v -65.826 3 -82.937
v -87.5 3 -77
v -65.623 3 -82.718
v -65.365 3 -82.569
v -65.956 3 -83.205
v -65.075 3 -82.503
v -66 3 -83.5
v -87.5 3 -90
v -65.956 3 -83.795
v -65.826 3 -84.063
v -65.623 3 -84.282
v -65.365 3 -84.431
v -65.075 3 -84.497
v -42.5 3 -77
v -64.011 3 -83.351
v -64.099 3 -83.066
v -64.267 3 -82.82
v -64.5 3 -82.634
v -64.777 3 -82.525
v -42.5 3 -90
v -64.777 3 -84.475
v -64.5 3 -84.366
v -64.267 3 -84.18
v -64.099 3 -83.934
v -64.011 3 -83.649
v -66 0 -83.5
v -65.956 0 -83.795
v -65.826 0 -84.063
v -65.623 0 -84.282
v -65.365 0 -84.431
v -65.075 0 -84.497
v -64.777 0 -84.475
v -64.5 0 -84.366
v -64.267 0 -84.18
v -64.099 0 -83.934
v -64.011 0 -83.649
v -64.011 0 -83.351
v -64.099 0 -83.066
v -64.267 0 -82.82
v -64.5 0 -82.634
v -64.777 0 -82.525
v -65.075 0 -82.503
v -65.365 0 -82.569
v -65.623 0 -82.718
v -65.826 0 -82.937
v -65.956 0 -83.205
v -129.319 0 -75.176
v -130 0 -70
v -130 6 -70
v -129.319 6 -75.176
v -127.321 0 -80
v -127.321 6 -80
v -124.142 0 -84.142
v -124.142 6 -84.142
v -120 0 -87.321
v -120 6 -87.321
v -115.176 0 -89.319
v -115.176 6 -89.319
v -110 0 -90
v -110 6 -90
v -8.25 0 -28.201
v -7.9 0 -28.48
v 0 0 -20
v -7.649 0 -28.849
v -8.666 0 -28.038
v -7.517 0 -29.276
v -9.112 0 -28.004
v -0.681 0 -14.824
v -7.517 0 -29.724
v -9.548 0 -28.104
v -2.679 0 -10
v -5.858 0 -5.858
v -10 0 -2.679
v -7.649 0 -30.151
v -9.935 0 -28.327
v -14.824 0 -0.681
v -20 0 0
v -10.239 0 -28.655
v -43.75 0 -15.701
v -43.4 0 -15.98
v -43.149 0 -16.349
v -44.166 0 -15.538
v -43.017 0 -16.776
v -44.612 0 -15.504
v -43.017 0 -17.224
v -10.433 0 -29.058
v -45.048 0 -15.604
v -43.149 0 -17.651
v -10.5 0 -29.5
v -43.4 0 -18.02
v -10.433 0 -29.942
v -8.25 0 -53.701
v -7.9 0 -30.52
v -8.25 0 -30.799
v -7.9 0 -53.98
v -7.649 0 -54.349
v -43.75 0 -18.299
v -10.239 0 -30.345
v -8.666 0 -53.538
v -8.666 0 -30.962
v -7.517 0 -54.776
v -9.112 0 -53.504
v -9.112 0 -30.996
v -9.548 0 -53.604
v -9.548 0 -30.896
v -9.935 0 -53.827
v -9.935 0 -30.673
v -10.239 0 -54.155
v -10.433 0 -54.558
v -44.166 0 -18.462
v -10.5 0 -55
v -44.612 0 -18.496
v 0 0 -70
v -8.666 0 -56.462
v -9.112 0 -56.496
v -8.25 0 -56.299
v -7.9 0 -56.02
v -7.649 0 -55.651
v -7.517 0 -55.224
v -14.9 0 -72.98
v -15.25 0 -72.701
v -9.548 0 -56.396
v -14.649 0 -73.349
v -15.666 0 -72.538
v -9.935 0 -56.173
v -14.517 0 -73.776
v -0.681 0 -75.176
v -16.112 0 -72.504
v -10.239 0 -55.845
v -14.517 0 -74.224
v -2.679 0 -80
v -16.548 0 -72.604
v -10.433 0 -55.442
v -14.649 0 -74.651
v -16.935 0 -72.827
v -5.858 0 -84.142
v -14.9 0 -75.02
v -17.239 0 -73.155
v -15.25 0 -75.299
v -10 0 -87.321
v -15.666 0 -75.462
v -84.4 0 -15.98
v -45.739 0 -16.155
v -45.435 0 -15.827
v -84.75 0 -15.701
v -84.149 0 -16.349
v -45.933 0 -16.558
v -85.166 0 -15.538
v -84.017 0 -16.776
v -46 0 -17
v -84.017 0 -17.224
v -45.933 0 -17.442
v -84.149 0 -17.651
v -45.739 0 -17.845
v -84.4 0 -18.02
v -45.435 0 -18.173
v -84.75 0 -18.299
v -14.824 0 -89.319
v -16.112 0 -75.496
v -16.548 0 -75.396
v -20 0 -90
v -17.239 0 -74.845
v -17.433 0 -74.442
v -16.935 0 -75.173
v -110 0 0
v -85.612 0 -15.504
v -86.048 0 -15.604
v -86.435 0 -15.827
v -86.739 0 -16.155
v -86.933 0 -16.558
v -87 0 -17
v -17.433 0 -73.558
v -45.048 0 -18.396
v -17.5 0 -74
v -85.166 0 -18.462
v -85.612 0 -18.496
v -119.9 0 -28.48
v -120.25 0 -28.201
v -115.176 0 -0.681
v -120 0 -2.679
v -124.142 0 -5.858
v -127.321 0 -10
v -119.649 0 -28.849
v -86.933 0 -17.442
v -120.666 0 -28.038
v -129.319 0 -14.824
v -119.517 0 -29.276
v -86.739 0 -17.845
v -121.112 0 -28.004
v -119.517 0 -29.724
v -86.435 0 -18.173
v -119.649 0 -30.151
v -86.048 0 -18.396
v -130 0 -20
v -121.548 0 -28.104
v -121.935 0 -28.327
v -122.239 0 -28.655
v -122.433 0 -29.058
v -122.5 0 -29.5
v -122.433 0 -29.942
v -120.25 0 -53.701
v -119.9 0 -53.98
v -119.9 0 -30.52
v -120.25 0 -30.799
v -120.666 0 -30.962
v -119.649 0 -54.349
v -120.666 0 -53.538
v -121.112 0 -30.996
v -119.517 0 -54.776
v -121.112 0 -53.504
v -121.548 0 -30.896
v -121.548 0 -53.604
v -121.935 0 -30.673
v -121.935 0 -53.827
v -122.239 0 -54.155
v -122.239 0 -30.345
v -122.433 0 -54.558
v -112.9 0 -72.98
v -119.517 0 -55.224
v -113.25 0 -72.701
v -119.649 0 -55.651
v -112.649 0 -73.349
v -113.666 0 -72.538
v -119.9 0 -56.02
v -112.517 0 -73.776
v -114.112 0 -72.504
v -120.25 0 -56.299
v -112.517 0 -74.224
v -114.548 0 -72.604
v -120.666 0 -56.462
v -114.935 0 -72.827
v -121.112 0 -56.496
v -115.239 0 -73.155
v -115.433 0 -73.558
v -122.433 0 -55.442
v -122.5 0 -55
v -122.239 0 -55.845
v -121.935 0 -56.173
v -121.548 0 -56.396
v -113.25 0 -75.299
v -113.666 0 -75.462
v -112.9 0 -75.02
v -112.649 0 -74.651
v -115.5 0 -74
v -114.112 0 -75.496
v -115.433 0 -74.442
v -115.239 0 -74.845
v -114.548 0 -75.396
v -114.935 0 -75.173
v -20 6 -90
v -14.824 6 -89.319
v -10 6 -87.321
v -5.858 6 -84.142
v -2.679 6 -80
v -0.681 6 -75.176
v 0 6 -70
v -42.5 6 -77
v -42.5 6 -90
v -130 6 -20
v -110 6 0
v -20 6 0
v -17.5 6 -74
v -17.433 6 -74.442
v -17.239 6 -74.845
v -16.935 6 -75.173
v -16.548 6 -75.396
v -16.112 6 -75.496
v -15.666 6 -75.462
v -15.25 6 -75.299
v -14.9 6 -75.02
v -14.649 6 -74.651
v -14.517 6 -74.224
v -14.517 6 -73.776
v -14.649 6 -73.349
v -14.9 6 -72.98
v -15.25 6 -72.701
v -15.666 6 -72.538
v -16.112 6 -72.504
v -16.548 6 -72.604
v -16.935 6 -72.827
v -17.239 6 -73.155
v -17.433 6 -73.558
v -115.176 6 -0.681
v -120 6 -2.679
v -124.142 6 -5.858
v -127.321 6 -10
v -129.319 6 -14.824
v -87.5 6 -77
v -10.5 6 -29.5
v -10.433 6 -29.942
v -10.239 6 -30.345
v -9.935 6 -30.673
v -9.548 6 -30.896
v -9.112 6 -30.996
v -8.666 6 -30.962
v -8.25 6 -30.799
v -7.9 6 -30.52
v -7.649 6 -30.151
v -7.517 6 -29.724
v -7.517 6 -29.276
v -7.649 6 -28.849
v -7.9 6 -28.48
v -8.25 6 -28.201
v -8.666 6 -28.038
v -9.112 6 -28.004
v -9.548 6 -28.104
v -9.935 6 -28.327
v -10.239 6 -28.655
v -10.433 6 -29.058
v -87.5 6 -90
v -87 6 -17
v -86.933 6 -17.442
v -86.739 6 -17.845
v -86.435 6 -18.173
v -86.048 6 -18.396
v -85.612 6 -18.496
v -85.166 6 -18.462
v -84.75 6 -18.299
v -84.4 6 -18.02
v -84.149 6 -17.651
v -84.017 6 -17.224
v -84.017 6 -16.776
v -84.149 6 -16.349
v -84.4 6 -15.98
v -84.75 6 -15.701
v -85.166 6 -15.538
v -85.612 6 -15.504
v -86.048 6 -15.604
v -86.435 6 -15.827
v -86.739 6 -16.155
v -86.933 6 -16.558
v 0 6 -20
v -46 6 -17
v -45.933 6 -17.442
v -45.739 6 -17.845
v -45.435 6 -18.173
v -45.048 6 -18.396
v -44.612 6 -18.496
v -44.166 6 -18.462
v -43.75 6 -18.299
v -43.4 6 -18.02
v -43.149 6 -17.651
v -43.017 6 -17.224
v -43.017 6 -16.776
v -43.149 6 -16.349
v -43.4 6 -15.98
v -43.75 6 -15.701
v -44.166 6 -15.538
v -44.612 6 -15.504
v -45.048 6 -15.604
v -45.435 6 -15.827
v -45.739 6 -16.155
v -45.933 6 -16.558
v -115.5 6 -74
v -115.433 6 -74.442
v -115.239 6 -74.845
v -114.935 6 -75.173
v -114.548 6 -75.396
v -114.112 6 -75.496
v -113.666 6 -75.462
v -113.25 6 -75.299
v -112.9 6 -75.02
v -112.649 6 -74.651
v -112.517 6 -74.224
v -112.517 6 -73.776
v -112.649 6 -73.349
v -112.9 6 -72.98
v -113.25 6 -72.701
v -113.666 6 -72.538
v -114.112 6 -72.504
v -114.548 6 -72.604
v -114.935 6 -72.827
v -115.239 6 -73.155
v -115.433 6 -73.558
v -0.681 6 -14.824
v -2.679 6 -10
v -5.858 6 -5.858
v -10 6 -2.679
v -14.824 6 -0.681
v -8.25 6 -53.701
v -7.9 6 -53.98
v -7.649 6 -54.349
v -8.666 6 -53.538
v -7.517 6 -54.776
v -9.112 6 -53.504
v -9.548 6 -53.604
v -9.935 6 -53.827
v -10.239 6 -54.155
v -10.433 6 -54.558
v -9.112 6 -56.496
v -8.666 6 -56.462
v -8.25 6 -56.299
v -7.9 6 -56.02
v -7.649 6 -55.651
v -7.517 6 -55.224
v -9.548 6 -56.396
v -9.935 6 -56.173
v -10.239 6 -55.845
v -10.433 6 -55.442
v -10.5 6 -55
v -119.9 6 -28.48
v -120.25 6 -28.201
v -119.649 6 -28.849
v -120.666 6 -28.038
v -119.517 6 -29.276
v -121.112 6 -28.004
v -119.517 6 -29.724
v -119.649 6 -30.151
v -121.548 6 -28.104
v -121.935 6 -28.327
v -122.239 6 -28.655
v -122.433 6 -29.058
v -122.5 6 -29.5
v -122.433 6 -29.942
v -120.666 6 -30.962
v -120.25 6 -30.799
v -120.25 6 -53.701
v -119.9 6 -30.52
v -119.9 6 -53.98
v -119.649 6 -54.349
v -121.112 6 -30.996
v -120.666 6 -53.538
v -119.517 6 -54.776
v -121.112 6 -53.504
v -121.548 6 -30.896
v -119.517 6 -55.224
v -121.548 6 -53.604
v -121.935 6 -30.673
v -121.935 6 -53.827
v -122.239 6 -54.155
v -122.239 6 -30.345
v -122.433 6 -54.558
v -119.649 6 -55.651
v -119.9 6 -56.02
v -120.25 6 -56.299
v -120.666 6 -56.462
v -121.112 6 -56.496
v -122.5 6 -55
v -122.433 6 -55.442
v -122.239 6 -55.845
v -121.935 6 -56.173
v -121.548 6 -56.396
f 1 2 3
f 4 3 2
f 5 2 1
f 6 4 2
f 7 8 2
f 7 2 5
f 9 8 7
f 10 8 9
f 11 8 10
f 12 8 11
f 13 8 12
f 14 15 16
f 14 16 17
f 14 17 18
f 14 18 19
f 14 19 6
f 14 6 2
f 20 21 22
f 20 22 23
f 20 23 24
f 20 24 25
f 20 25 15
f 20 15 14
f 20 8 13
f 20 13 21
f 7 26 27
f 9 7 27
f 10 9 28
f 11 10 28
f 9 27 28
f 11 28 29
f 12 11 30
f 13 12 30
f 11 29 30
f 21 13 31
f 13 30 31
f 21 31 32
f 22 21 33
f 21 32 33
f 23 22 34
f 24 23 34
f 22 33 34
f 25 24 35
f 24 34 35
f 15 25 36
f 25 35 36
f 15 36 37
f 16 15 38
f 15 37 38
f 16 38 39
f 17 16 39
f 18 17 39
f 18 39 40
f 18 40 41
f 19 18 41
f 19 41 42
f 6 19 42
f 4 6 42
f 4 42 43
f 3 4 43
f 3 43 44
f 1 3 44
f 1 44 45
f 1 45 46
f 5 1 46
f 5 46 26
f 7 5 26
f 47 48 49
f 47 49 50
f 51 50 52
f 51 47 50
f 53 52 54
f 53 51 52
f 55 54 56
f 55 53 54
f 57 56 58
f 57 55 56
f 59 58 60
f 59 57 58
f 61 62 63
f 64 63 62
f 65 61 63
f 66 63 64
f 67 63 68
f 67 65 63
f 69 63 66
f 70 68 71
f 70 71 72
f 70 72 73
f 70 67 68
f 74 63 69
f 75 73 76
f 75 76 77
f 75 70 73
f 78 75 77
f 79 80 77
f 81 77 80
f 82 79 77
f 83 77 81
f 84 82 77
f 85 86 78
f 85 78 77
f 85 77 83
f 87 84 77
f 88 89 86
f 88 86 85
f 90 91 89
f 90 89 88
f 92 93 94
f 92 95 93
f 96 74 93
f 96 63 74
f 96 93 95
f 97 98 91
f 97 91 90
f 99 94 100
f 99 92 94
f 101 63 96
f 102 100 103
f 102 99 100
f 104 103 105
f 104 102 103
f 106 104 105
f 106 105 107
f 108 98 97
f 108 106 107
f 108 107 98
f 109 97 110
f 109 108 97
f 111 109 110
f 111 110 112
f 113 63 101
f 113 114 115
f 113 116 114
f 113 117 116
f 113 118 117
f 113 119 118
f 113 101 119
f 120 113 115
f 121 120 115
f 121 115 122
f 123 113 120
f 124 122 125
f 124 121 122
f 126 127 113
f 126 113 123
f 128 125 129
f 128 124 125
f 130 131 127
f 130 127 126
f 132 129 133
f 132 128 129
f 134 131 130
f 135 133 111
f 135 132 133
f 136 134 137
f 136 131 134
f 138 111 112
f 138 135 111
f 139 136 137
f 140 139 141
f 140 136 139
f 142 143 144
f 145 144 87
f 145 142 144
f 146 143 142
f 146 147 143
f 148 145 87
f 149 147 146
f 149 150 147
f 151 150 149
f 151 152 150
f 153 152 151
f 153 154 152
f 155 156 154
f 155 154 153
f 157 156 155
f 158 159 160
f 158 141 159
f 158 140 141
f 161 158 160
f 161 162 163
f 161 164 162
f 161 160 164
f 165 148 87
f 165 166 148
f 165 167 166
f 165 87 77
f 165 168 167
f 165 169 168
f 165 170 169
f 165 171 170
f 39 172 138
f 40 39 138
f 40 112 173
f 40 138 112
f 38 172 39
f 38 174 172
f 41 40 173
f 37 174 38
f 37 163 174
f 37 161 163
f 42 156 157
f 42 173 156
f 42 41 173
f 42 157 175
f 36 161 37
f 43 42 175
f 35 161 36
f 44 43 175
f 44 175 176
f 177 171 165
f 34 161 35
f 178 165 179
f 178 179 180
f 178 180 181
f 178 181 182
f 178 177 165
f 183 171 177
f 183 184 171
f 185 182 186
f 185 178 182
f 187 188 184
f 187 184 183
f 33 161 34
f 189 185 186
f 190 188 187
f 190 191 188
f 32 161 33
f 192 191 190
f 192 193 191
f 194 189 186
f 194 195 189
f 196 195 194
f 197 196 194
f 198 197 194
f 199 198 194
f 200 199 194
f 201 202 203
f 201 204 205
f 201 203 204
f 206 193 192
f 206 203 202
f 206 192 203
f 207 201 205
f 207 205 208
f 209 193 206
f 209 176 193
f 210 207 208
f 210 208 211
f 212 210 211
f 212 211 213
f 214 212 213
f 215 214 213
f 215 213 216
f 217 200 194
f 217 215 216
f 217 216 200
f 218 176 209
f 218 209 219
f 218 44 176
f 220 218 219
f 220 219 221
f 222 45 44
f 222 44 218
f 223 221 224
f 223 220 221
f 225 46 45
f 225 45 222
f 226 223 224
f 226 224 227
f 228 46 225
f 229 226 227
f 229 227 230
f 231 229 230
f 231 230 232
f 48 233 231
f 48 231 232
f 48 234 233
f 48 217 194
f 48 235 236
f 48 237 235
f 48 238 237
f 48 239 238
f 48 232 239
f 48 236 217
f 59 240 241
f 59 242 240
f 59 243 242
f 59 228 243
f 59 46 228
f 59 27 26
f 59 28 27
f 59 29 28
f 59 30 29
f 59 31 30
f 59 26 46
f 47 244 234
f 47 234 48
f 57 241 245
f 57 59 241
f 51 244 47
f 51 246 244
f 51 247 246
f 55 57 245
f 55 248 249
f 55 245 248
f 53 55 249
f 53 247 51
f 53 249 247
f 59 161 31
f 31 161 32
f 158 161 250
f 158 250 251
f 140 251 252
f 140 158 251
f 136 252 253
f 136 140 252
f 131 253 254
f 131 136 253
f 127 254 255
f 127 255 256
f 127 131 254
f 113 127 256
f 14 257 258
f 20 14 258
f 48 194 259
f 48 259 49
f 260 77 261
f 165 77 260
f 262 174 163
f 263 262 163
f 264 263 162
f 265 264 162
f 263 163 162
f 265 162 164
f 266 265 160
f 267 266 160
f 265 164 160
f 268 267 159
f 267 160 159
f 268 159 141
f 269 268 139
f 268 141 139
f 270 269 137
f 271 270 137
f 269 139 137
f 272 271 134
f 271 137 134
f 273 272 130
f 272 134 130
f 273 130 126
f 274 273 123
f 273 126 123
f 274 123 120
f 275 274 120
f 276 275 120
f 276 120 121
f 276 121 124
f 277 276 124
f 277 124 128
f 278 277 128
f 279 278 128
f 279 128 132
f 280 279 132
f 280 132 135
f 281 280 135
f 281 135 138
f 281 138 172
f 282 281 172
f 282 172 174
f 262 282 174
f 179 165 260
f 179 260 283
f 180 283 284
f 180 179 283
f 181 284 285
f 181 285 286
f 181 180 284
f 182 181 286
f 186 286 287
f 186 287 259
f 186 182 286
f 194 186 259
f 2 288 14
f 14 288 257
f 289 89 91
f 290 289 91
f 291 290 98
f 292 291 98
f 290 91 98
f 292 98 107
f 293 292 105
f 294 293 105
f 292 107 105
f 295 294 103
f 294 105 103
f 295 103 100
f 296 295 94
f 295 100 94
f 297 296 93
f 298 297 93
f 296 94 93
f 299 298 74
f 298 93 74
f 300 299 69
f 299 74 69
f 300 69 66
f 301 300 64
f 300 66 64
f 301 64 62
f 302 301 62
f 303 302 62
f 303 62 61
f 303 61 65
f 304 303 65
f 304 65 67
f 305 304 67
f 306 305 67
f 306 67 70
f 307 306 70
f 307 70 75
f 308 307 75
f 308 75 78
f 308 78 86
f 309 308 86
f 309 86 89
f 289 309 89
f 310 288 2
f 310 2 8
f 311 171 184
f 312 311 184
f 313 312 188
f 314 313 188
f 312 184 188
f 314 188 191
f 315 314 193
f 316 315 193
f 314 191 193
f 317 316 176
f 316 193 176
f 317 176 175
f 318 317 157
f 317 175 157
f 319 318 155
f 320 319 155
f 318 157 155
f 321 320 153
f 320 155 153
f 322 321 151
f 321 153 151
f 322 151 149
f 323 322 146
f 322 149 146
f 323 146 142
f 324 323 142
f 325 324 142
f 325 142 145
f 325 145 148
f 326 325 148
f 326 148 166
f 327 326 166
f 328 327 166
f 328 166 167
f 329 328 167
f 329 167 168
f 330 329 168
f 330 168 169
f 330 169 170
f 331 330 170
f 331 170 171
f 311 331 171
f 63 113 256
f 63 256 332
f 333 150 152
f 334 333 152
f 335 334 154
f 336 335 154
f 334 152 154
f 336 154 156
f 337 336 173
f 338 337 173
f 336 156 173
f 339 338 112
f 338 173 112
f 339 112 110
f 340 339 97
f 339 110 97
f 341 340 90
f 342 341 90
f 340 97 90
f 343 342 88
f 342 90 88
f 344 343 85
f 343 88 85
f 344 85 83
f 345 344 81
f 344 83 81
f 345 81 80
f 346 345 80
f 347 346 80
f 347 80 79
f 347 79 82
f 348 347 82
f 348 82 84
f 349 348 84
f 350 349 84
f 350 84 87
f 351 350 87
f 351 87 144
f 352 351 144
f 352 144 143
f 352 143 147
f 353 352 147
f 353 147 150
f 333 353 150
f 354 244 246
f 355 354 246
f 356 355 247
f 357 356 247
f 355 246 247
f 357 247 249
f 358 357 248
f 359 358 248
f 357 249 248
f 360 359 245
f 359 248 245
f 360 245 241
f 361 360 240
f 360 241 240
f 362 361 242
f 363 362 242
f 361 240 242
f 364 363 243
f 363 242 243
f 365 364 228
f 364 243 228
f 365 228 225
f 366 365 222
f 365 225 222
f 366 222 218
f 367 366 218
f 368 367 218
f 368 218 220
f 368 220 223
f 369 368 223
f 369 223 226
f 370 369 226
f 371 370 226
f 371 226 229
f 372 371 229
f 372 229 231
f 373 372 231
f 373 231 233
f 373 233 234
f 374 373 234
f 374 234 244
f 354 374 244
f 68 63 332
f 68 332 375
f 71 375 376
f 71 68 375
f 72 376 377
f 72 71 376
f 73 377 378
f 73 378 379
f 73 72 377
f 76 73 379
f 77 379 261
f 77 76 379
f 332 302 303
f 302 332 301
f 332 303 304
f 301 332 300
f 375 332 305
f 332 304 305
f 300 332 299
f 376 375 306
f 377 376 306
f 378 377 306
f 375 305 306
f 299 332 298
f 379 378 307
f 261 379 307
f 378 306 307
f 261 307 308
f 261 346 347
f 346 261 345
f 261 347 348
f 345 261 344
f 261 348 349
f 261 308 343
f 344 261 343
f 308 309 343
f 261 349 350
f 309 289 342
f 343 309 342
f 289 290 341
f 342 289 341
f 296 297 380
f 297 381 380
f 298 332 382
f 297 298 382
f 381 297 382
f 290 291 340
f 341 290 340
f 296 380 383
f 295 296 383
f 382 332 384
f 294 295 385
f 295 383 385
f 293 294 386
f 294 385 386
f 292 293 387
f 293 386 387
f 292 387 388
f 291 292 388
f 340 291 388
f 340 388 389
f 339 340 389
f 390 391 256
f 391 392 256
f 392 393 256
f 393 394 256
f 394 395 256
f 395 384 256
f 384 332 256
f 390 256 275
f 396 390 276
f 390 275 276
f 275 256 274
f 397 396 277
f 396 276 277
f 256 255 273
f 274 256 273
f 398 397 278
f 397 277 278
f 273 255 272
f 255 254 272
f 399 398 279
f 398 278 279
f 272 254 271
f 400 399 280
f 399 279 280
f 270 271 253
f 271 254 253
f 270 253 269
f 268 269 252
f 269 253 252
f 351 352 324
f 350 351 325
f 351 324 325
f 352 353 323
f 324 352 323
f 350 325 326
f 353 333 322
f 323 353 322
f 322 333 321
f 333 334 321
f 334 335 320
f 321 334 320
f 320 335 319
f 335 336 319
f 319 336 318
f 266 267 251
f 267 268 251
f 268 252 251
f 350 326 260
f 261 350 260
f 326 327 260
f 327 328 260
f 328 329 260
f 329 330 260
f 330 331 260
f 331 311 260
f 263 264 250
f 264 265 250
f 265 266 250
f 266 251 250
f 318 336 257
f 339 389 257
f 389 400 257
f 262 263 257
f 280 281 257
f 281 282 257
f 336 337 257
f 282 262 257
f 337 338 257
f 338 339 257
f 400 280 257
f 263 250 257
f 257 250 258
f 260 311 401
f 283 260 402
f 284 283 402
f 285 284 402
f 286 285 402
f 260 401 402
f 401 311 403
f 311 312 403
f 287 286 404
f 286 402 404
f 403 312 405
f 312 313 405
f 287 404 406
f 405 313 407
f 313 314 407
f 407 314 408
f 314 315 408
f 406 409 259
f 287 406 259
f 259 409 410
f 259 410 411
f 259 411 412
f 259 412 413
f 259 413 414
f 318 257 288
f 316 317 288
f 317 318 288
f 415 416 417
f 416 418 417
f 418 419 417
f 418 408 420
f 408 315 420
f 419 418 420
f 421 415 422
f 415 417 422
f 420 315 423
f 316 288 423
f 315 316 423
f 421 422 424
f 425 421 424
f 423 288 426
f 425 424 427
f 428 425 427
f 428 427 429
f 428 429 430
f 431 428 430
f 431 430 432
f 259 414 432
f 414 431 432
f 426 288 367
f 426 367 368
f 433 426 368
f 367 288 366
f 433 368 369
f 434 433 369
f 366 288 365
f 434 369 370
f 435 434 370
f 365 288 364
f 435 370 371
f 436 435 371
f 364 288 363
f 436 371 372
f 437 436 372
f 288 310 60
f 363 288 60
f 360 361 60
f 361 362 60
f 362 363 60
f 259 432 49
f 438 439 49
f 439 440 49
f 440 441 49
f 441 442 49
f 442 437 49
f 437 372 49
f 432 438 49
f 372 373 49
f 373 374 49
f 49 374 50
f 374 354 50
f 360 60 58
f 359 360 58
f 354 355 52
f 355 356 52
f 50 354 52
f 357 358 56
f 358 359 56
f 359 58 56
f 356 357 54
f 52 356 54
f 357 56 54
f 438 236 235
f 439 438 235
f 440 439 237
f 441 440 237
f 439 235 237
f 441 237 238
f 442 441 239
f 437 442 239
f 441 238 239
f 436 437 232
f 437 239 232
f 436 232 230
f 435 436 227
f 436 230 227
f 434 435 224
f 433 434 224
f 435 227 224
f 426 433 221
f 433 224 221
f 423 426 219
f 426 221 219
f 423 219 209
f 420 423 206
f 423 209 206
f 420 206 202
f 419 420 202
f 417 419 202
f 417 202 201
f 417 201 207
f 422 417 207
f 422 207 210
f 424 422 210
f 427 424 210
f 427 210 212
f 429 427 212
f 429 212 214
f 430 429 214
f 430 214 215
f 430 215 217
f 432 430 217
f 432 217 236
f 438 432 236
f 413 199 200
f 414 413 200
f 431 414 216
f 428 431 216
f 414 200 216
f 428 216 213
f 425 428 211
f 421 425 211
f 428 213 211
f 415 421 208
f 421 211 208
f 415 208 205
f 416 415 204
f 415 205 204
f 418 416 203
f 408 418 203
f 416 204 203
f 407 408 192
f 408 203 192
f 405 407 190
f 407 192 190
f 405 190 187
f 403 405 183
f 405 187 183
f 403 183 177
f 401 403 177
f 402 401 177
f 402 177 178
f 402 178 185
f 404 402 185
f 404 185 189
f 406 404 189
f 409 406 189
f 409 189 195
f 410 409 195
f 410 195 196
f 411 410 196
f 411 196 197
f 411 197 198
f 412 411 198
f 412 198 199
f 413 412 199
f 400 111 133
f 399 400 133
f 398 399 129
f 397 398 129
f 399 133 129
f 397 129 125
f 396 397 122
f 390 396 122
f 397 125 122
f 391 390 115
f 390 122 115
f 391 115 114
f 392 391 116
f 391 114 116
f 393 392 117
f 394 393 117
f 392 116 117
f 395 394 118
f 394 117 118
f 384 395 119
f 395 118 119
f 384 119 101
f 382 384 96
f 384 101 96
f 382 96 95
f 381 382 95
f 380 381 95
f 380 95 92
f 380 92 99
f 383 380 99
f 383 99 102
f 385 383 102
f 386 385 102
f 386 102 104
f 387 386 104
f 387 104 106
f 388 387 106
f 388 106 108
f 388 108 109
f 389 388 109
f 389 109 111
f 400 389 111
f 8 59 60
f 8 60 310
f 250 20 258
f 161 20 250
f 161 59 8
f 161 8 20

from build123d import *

# Parameters (mm, degrees)
BOSS_EXTRUDE1_DEPTH       = 6
SKETCH3_W                 = 45
SKETCH3_H                 = 13
CUT_EXTRUDE1_DEPTH        = 3
F_2_0MM_DOWEL_HOLE1_D     = 2
F_2_0MM_DOWEL_HOLE1_DEPTH = 12
F_2_0MM_DOWEL_HOLE1_TIP   = 0.600860619
F_3_0MM_DOWEL_HOLE1_D     = 3
F_3_0MM_DOWEL_HOLE1_DEPTH = 12
F_3_0MM_DOWEL_HOLE1_TIP   = 0.901290929


with BuildPart() as part:
    # Sketch2 → Boss-Extrude1 (new body)
    with BuildSketch(Plane(origin=(0, 0, 0), x_dir=(1, 0, 0), z_dir=(0, 1, 0))):
        with BuildLine():
            Line((-20, 0), (-110, 0))
            ThreePointArc((-110, 0), (-124.142135624, 5.857864376), (-130, 20))
            Line((-130, 20), (-130, 70))
            ThreePointArc((-130, 70), (-124.142135624, 84.142135624), (-110, 90))
            Line((-110, 90), (-20, 90))
            ThreePointArc((-20, 90), (-5.857864376, 84.142135624), (0, 70))
            Line((0, 70), (0, 20))
            ThreePointArc((0, 20), (-5.857864376, 5.857864376), (-20, 0))
        make_face()
    extrude(amount=BOSS_EXTRUDE1_DEPTH)

    # Sketch3 → Cut-Extrude1 (cut)
    with BuildSketch(Plane(origin=(0, 6, 0), x_dir=(1, 0, 0), z_dir=(0, 1, 0))):
        with Locations((-65, 83.5)):
            Rectangle(SKETCH3_W, SKETCH3_H)
    extrude(amount=-CUT_EXTRUDE1_DEPTH, mode=Mode.SUBTRACT)

    # Ø2.0mm Dowel Hole1
    with Locations(Plane(origin=(0, 3, 0), x_dir=(1, 0, 0), z_dir=(0, 1, 0))):
        with Locations((-65, 83.5)):
            Hole(F_2_0MM_DOWEL_HOLE1_D / 2, depth=F_2_0MM_DOWEL_HOLE1_DEPTH)
            with Locations((0, 0, -(F_2_0MM_DOWEL_HOLE1_DEPTH + F_2_0MM_DOWEL_HOLE1_TIP / 2))):  # 118° drill point
                Cone(0, F_2_0MM_DOWEL_HOLE1_D / 2, F_2_0MM_DOWEL_HOLE1_TIP, mode=Mode.SUBTRACT)

    # Ø3.0mm Dowel Hole1
    with Locations(Plane(origin=(0, 6, 0), x_dir=(1, 0, 0), z_dir=(0, 1, 0))):
        with Locations((-114, 74), (-16, 74), (-121, 55), (-9, 55), (-121, 29.5), (-9, 29.5), (-85.5, 17), (-44.5, 17)):
            Hole(F_3_0MM_DOWEL_HOLE1_D / 2, depth=F_3_0MM_DOWEL_HOLE1_DEPTH)
            with Locations((0, 0, -(F_3_0MM_DOWEL_HOLE1_DEPTH + F_3_0MM_DOWEL_HOLE1_TIP / 2))):  # 118° drill point
                Cone(0, F_3_0MM_DOWEL_HOLE1_D / 2, F_3_0MM_DOWEL_HOLE1_TIP, mode=Mode.SUBTRACT)


solid = part.part
